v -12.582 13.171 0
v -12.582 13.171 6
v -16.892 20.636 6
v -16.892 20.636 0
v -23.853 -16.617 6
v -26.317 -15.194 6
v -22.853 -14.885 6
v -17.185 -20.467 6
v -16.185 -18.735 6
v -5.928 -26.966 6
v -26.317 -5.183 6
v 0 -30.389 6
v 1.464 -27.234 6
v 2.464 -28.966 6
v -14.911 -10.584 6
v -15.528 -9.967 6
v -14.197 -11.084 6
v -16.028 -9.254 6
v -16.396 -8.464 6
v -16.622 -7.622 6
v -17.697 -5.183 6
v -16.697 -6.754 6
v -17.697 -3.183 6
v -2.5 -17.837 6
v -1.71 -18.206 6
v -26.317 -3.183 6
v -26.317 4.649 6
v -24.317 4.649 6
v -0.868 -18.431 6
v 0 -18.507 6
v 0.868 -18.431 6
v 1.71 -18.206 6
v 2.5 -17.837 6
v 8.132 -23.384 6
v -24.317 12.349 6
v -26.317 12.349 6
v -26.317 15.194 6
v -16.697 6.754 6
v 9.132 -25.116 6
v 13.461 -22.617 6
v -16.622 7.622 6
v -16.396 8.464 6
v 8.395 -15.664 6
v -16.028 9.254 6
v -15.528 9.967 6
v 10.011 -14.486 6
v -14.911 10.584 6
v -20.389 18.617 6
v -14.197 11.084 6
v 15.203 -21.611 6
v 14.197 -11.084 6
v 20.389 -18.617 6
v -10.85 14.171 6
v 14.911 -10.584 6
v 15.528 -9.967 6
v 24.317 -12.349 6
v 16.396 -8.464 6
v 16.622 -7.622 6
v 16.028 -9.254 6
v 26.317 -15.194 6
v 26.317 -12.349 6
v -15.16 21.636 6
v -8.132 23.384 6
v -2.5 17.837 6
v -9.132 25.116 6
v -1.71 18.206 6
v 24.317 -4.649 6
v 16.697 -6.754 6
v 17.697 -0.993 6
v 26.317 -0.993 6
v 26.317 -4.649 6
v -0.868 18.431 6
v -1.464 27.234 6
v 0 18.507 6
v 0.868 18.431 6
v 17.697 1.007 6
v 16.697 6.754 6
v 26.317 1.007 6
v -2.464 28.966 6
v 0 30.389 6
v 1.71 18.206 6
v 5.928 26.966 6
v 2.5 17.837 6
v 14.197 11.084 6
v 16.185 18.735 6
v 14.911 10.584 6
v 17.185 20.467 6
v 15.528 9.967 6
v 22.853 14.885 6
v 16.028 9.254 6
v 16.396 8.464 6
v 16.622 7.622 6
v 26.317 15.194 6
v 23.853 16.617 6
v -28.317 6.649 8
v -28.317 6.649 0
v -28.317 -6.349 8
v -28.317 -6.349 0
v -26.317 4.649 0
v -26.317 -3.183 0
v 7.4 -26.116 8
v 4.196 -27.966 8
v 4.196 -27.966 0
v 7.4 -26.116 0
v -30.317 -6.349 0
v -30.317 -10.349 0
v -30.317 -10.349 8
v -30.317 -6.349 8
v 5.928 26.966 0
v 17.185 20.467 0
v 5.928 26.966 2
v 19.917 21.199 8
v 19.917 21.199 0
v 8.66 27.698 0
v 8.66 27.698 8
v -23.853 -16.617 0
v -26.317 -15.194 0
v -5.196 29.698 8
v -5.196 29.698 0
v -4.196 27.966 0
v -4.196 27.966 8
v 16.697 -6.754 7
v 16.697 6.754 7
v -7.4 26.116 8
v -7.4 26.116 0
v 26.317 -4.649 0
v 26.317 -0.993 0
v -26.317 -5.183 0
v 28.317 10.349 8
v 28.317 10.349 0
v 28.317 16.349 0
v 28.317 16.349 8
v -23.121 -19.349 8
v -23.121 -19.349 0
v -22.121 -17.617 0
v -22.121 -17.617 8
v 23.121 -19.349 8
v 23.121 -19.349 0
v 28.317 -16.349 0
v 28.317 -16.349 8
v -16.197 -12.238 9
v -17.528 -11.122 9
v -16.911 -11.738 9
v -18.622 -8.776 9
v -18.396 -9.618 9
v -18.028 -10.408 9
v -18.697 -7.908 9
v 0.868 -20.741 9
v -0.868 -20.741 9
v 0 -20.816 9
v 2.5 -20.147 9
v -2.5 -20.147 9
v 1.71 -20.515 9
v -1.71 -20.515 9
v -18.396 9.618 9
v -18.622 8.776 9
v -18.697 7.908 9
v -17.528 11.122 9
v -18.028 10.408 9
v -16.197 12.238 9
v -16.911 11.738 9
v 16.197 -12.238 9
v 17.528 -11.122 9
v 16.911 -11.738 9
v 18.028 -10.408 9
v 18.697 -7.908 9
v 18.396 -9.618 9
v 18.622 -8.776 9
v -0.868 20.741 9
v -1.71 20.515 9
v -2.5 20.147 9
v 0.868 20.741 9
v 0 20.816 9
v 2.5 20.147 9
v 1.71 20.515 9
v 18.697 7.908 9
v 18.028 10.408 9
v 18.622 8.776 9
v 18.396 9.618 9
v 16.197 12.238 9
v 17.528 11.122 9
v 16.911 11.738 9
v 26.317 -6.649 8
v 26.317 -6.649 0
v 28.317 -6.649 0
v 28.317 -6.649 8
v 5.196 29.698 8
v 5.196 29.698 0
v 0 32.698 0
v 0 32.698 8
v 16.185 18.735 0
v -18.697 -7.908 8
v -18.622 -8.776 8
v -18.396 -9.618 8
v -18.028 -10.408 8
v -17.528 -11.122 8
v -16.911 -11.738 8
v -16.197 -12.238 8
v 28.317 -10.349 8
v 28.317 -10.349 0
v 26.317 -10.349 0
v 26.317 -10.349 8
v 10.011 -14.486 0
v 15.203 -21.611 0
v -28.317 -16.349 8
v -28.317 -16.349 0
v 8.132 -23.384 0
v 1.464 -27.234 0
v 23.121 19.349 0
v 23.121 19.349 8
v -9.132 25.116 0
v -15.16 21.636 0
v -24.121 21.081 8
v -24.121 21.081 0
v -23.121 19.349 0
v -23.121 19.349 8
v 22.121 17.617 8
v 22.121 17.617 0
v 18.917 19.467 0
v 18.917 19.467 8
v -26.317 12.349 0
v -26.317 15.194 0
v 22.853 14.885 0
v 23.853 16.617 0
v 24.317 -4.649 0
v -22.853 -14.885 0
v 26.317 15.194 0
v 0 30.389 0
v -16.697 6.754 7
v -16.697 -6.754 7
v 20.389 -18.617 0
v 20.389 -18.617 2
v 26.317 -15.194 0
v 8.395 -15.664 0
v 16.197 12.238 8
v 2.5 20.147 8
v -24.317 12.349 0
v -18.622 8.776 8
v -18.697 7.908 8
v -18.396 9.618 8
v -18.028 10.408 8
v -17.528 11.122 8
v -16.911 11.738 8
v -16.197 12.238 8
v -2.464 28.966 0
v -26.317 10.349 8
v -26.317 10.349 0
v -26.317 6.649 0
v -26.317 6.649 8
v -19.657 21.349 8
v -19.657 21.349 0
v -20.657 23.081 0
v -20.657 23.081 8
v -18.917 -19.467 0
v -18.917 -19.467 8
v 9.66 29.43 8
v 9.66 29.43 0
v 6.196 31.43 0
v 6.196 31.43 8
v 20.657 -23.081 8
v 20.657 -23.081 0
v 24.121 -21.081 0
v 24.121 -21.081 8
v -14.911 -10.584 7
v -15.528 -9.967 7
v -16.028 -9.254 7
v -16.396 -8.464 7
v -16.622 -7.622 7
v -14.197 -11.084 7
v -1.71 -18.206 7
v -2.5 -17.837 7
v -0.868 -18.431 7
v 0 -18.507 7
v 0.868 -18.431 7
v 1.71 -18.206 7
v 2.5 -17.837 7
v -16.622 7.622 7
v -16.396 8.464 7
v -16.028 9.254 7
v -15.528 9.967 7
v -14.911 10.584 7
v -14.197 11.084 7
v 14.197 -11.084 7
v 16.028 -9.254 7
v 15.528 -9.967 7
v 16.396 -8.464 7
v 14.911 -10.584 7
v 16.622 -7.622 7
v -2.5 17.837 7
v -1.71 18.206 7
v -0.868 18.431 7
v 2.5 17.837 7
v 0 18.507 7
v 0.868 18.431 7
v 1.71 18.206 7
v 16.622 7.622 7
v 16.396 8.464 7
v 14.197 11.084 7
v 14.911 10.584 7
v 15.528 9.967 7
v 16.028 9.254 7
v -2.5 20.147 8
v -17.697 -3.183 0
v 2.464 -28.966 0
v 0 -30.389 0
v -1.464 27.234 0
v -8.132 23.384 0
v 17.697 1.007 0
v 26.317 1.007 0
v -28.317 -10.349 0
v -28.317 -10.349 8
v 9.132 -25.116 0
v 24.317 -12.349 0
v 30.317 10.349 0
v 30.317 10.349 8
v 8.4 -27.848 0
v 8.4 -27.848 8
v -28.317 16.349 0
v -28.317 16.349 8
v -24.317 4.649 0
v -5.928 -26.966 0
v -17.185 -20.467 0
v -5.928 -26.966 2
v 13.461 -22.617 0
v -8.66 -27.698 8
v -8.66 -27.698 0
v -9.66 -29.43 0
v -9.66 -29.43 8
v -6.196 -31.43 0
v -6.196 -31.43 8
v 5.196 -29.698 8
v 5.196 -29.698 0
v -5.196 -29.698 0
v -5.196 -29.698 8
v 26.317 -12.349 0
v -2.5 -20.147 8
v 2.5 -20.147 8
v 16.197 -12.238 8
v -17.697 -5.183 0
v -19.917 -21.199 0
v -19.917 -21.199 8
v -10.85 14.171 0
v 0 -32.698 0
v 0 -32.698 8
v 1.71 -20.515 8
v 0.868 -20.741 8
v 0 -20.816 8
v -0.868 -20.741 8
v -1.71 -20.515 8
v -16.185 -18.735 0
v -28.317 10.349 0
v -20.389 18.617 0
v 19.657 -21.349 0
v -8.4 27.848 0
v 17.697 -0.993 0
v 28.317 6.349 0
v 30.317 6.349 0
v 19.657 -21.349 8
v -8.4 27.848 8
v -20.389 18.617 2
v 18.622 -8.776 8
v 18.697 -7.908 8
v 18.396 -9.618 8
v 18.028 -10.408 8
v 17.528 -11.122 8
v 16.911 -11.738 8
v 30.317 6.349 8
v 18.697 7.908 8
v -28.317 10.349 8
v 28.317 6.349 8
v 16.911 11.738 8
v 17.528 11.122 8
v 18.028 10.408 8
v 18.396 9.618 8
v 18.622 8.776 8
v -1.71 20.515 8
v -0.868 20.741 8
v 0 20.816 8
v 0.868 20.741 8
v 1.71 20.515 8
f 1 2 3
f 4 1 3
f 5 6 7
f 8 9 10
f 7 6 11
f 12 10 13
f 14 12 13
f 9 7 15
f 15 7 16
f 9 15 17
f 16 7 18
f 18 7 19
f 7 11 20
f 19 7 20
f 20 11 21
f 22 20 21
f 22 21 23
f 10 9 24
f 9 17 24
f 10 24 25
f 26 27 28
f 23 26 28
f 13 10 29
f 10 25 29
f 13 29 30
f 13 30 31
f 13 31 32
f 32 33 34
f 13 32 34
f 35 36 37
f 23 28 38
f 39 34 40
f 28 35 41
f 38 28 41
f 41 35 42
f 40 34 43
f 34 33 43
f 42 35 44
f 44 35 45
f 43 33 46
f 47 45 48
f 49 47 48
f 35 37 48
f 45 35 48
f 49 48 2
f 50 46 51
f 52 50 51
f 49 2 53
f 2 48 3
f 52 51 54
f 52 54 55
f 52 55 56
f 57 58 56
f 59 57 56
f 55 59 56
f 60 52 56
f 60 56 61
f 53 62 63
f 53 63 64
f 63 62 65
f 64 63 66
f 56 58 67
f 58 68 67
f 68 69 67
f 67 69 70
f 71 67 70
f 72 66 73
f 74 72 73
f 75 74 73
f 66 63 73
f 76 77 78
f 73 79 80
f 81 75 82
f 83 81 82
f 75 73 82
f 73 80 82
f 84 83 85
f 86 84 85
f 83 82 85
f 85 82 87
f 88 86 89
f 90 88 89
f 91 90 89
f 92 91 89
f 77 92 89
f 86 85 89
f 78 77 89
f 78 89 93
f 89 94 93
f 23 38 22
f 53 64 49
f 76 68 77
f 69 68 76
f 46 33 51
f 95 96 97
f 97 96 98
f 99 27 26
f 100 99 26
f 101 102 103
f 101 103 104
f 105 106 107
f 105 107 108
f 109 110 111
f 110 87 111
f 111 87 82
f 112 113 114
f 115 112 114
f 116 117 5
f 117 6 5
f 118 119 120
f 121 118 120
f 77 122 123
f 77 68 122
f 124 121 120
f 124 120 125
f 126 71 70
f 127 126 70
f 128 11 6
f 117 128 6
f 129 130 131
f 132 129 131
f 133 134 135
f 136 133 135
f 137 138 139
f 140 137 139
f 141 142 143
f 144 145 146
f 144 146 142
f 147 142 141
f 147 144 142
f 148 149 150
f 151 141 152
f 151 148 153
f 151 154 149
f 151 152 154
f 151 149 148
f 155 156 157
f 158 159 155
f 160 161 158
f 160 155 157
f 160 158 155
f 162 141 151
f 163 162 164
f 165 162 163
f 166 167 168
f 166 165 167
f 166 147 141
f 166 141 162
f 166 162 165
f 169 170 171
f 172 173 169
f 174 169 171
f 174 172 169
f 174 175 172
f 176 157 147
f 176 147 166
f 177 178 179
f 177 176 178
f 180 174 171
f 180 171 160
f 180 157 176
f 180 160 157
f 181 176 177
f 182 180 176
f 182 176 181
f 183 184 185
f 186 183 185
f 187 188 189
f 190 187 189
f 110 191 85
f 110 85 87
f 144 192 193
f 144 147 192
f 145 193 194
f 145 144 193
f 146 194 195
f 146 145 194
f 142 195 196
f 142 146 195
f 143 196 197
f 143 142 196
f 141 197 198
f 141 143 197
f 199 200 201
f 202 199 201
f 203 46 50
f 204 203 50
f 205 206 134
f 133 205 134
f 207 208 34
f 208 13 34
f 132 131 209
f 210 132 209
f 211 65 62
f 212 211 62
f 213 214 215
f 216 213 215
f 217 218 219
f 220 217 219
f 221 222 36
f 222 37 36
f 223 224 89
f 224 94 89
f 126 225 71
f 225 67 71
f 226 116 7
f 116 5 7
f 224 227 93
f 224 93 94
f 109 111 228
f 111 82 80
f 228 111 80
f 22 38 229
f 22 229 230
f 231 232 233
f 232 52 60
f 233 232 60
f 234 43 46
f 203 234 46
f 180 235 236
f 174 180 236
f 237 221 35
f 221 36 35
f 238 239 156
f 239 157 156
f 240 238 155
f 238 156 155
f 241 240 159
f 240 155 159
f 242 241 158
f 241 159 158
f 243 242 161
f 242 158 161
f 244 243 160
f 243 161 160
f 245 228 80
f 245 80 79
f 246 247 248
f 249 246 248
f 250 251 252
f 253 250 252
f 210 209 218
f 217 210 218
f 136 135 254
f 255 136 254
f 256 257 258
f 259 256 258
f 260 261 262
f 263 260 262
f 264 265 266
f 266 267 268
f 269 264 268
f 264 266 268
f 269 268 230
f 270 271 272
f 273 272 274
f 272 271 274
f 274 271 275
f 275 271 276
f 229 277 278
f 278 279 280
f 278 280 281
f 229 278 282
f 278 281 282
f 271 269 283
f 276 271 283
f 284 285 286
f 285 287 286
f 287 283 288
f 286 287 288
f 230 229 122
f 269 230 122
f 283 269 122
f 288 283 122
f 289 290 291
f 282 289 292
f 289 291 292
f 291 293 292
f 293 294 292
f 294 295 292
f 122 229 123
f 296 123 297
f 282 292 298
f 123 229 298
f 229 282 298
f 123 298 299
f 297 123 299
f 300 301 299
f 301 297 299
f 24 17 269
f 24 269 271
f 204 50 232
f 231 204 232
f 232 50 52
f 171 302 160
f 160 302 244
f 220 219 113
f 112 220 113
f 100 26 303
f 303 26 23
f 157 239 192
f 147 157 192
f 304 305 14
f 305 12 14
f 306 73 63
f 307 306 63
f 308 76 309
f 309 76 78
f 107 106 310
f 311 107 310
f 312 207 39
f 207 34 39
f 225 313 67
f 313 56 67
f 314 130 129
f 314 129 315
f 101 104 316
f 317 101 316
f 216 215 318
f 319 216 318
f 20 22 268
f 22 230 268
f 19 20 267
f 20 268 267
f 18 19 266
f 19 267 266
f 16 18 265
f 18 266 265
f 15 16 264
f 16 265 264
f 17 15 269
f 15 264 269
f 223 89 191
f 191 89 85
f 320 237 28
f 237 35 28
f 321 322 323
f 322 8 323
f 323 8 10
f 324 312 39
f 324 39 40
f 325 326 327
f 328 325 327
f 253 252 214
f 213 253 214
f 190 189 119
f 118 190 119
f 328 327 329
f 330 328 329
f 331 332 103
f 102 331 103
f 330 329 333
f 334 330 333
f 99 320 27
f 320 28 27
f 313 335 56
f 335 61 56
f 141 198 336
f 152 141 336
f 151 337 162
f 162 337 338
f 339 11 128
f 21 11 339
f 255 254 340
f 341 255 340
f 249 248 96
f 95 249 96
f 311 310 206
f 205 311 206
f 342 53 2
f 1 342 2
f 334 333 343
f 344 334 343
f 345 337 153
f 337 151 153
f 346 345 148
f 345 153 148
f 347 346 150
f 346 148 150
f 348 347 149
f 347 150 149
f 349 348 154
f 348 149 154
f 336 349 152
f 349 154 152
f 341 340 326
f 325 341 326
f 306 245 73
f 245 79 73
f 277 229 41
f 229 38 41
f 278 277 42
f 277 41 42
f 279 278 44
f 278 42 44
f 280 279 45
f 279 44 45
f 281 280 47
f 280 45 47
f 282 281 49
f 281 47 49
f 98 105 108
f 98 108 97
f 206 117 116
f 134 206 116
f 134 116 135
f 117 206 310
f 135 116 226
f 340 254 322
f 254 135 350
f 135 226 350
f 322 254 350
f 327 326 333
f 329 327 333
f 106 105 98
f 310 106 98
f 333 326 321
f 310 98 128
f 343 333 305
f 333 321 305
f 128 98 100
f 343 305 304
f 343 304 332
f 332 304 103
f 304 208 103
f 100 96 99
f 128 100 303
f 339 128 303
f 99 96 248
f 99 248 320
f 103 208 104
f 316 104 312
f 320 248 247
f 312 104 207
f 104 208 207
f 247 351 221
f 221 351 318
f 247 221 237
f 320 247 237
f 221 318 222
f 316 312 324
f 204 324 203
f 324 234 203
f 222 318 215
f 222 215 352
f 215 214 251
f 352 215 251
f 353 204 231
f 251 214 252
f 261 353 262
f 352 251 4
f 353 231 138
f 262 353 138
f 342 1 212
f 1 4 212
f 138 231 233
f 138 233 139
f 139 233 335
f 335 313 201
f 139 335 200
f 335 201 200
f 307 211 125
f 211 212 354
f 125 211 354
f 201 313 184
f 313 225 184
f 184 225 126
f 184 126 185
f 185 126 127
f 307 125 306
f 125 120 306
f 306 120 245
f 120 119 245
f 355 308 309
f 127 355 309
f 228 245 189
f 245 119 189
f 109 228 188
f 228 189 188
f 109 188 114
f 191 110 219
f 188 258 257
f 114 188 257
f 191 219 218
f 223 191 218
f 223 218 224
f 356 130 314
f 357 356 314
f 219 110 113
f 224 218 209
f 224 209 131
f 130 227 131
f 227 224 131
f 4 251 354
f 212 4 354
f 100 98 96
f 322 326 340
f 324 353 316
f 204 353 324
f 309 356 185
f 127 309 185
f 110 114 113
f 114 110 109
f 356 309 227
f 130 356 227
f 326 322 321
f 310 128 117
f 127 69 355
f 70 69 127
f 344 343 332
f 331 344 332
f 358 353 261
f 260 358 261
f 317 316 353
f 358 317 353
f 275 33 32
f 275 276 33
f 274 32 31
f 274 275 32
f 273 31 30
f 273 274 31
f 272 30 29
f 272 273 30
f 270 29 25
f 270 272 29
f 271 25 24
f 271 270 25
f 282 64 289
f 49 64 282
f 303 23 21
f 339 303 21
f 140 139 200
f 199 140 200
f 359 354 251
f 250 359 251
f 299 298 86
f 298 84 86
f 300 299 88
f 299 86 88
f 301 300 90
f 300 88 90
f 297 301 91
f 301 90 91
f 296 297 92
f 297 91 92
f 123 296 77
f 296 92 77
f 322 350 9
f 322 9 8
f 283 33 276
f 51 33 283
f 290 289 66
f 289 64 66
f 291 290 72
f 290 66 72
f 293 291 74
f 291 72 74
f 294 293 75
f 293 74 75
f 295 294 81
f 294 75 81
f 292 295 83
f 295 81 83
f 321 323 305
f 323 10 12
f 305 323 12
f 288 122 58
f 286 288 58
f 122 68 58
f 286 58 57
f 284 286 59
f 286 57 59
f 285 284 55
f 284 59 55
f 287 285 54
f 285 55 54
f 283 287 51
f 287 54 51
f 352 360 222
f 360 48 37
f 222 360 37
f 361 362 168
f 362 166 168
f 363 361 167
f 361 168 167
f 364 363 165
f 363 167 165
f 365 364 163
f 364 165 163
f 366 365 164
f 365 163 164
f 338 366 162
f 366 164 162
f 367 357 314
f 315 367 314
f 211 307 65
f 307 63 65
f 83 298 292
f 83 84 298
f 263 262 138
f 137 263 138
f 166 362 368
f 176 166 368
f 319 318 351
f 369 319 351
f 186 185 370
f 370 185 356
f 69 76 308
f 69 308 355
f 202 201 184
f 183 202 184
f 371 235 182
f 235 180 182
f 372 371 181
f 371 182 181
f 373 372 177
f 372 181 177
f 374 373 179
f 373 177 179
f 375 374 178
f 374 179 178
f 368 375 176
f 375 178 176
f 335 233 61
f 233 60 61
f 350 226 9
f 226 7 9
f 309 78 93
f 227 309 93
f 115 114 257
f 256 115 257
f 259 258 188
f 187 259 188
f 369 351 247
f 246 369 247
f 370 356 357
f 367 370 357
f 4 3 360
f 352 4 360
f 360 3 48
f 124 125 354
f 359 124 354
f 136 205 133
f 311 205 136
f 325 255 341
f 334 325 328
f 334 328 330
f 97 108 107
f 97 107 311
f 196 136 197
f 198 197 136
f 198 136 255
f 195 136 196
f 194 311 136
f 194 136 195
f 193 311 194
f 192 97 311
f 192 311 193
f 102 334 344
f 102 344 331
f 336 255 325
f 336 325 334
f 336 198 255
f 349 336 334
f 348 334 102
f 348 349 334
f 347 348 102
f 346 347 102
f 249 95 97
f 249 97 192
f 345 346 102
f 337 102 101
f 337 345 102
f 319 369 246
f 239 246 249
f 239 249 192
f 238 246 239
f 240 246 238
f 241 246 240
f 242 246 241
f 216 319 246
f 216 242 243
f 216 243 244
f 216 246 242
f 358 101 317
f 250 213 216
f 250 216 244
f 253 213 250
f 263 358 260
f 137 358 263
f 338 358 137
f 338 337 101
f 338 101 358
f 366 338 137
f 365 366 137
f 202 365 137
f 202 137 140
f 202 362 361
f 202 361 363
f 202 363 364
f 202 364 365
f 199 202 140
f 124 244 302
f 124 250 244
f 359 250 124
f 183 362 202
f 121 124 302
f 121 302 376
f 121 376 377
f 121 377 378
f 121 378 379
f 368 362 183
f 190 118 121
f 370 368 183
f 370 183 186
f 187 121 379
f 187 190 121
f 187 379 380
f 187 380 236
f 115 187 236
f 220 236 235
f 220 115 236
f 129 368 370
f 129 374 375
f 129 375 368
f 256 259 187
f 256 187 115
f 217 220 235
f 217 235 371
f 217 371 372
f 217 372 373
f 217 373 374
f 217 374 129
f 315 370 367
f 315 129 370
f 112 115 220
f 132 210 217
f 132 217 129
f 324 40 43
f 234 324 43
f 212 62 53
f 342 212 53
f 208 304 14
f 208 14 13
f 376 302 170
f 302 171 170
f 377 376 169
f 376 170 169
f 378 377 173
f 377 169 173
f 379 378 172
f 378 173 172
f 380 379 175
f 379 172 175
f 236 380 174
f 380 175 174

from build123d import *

# Parameters (mm, degrees)
F0_W     = 2
F0_H     = 4
F1_DEPTH = 8
F2_DEPTH = 9
F3_T     = -2
F4_R     = 5
F5_R     = 5
F6_W     = 8.62
F6_H     = 2
F7_DEPTH = 6


with BuildPart() as f1:
    # F0 (on Top) → F1 (new body)
    with BuildSketch(Plane.XY):
        Polygon((-23.121336045, 19.3491095896), (-19.6572344299, 21.3491095896), (-20.6572344299, 23.0811603972), (-24.121336045, 21.0811603972), align=None)
        Polygon((-7.4004464167, 26.1161683716), (-26.3174884677, 15.1944090512), (-26.3174884677, 10.3491095896), (-26.3174884677, 6.6491095896), (-26.3174884677, -15.1944090512), (-22.121336045, -17.617058782), (-18.917042051, -19.467058782), (0, -30.3888181024), (4.1961524227, -27.9661683716), (7.4004464167, -26.1161683716), (26.3174884677, -15.1944090512), (26.3174884677, -10.3491095896), (26.3174884677, -6.6491095896), (26.3174884677, 15.1944090512), (22.121336045, 17.617058782), (18.917042051, 19.467058782), (0, 30.3888181024), (-4.1961524227, 27.9661683716), align=None)
        Polygon((0, -21.59), (-18.6974884677, -10.795), (-18.6974884677, 10.795), (0, 21.59), (18.6974884677, 10.795), (18.6974884677, -10.795), align=None, mode=Mode.SUBTRACT)
        Polygon((-5.1961524227, -29.6982191792), (-8.6602540378, -27.6982191792), (-9.6602540378, -29.4302699868), (-6.1961524227, -31.4302699868), align=None)
        with Locations((29.3174884677, 8.3491095896)):
            Rectangle(F0_W, F0_H)
        with Locations((-29.3174884677, -8.3491095896)):
            Rectangle(F0_W, F0_H)
        Polygon((-26.3174884677, -15.1944090512), (-26.3174884677, 6.6491095896), (-28.3174884677, 6.6491095896), (-28.3174884677, -6.3491095896), (-28.3174884677, -10.3491095896), (-28.3174884677, -16.3491095896), (-23.121336045, -19.3491095896), (-22.121336045, -17.617058782), align=None)
        Polygon((-26.3174884677, 10.3491095896), (-26.3174884677, 15.1944090512), (-7.4004464167, 26.1161683716), (-8.4004464167, 27.8482191792), (-19.6572344299, 21.3491095896), (-23.121336045, 19.3491095896), (-28.3174884677, 16.3491095896), (-28.3174884677, 10.3491095896), align=None)
        Polygon((0, -30.3888181024), (-18.917042051, -19.467058782), (-19.917042051, -21.1991095896), (-8.6602540378, -27.6982191792), (-5.1961524227, -29.6982191792), (0, -32.6982191792), (5.1961524227, -29.6982191792), (4.1961524227, -27.9661683716), align=None)
        Polygon((28.3174884677, -10.3491095896), (26.3174884677, -10.3491095896), (26.3174884677, -15.1944090512), (7.4004464167, -26.1161683716), (8.4004464167, -27.8482191792), (19.6572344299, -21.3491095896), (23.121336045, -19.3491095896), (28.3174884677, -16.3491095896), align=None)
        Polygon((23.121336045, -19.3491095896), (19.6572344299, -21.3491095896), (20.6572344299, -23.0811603972), (24.121336045, -21.0811603972), align=None)
        Polygon((-5.1961524227, 29.6982191792), (-4.1961524227, 27.9661683716), (0, 30.3888181024), (18.917042051, 19.467058782), (19.917042051, 21.1991095896), (8.6602540378, 27.6982191792), (5.1961524227, 29.6982191792), (0, 32.6982191792), align=None)
        Polygon((6.1961524227, 31.4302699868), (5.1961524227, 29.6982191792), (8.6602540378, 27.6982191792), (9.6602540378, 29.4302699868), align=None)
        Polygon((23.121336045, 19.3491095896), (22.121336045, 17.617058782), (26.3174884677, 15.1944090512), (26.3174884677, -6.6491095896), (28.3174884677, -6.6491095896), (28.3174884677, 6.3491095896), (28.3174884677, 10.3491095896), (28.3174884677, 16.3491095896), align=None)
    extrude(amount=F1_DEPTH)

    # F0 (on Top) → F2 (join)
    with BuildSketch(Plane.XY):
        Polygon((-18.6974884677, 10.795), (-18.6974884677, -10.795), (0, -21.59), (18.6974884677, -10.795), (18.6974884677, 10.795), (0, 21.59), align=None)
    extrude(amount=F2_DEPTH)

    # F3: a shell. OpenCascade refuses it in one call, so the cavity is built on its own and cut out:
    # the body offset inwards by the wall thickness, plus a prism from it out through each open face.
    f3_core = offset(f1.part, amount=F3_T, kind=Kind.INTERSECTION, mode=Mode.PRIVATE)
    f3_exits = [f3_core.faces().sort_by_distance(p)[0] for p in [
        (0, 0, 2),
    ]]
    add(f3_core, mode=Mode.SUBTRACT)
    extrude(f3_exits, amount=-F3_T, mode=Mode.SUBTRACT)

    # F4
    f4_edges = [f1.edges().sort_by_distance(p)[0] for p in [
        (-18.697488, 10.795, 8.5),
        (-18.697488, -10.795, 8.5),
        (0, -21.59, 8.5),
        (18.697488, -10.795, 8.5),
        (18.697488, 10.795, 8.5),
        (0, 21.59, 8.5),
    ]]
    fillet(f4_edges, radius=F4_R)

    # F5
    f5_edges = [f1.edges().sort_by_distance(p)[0] for p in [
        (16.697488, -9.640299, 6.5),
        (0, -19.280599, 6.5),
        (-16.697488, -9.640299, 6.5),
        (-16.697488, 9.640299, 6.5),
        (0, 19.280599, 6.5),
        (16.697488, 9.640299, 6.5),
    ]]
    fillet(f5_edges, radius=F5_R)

    # F6 (on face) → F7 (join)
    with BuildSketch(Plane(origin=(0, 0, 6), x_dir=(1, 0, 0), z_dir=(0, 0, -1))):
        Polygon((15.2029661558, 21.6113814999), (13.4611243361, 22.6170343434), (8.3950167715, 15.6640247696), (10.0114517622, 14.4862565748), align=None)
        with Locations((-22.0074884677, 4.1833669636)):
            Rectangle(F6_W, F6_H)
        with Locations((22.0074884677, -0.0066501563)):
            Rectangle(F6_W, F6_H)
        Polygon((-12.5819755408, -13.1710924962), (-16.8919755408, -20.6362314769), (-15.1599247332, -21.6362314769), (-10.8499247332, -14.1710924962), align=None)
    extrude(amount=F7_DEPTH)


solid = f1.part
